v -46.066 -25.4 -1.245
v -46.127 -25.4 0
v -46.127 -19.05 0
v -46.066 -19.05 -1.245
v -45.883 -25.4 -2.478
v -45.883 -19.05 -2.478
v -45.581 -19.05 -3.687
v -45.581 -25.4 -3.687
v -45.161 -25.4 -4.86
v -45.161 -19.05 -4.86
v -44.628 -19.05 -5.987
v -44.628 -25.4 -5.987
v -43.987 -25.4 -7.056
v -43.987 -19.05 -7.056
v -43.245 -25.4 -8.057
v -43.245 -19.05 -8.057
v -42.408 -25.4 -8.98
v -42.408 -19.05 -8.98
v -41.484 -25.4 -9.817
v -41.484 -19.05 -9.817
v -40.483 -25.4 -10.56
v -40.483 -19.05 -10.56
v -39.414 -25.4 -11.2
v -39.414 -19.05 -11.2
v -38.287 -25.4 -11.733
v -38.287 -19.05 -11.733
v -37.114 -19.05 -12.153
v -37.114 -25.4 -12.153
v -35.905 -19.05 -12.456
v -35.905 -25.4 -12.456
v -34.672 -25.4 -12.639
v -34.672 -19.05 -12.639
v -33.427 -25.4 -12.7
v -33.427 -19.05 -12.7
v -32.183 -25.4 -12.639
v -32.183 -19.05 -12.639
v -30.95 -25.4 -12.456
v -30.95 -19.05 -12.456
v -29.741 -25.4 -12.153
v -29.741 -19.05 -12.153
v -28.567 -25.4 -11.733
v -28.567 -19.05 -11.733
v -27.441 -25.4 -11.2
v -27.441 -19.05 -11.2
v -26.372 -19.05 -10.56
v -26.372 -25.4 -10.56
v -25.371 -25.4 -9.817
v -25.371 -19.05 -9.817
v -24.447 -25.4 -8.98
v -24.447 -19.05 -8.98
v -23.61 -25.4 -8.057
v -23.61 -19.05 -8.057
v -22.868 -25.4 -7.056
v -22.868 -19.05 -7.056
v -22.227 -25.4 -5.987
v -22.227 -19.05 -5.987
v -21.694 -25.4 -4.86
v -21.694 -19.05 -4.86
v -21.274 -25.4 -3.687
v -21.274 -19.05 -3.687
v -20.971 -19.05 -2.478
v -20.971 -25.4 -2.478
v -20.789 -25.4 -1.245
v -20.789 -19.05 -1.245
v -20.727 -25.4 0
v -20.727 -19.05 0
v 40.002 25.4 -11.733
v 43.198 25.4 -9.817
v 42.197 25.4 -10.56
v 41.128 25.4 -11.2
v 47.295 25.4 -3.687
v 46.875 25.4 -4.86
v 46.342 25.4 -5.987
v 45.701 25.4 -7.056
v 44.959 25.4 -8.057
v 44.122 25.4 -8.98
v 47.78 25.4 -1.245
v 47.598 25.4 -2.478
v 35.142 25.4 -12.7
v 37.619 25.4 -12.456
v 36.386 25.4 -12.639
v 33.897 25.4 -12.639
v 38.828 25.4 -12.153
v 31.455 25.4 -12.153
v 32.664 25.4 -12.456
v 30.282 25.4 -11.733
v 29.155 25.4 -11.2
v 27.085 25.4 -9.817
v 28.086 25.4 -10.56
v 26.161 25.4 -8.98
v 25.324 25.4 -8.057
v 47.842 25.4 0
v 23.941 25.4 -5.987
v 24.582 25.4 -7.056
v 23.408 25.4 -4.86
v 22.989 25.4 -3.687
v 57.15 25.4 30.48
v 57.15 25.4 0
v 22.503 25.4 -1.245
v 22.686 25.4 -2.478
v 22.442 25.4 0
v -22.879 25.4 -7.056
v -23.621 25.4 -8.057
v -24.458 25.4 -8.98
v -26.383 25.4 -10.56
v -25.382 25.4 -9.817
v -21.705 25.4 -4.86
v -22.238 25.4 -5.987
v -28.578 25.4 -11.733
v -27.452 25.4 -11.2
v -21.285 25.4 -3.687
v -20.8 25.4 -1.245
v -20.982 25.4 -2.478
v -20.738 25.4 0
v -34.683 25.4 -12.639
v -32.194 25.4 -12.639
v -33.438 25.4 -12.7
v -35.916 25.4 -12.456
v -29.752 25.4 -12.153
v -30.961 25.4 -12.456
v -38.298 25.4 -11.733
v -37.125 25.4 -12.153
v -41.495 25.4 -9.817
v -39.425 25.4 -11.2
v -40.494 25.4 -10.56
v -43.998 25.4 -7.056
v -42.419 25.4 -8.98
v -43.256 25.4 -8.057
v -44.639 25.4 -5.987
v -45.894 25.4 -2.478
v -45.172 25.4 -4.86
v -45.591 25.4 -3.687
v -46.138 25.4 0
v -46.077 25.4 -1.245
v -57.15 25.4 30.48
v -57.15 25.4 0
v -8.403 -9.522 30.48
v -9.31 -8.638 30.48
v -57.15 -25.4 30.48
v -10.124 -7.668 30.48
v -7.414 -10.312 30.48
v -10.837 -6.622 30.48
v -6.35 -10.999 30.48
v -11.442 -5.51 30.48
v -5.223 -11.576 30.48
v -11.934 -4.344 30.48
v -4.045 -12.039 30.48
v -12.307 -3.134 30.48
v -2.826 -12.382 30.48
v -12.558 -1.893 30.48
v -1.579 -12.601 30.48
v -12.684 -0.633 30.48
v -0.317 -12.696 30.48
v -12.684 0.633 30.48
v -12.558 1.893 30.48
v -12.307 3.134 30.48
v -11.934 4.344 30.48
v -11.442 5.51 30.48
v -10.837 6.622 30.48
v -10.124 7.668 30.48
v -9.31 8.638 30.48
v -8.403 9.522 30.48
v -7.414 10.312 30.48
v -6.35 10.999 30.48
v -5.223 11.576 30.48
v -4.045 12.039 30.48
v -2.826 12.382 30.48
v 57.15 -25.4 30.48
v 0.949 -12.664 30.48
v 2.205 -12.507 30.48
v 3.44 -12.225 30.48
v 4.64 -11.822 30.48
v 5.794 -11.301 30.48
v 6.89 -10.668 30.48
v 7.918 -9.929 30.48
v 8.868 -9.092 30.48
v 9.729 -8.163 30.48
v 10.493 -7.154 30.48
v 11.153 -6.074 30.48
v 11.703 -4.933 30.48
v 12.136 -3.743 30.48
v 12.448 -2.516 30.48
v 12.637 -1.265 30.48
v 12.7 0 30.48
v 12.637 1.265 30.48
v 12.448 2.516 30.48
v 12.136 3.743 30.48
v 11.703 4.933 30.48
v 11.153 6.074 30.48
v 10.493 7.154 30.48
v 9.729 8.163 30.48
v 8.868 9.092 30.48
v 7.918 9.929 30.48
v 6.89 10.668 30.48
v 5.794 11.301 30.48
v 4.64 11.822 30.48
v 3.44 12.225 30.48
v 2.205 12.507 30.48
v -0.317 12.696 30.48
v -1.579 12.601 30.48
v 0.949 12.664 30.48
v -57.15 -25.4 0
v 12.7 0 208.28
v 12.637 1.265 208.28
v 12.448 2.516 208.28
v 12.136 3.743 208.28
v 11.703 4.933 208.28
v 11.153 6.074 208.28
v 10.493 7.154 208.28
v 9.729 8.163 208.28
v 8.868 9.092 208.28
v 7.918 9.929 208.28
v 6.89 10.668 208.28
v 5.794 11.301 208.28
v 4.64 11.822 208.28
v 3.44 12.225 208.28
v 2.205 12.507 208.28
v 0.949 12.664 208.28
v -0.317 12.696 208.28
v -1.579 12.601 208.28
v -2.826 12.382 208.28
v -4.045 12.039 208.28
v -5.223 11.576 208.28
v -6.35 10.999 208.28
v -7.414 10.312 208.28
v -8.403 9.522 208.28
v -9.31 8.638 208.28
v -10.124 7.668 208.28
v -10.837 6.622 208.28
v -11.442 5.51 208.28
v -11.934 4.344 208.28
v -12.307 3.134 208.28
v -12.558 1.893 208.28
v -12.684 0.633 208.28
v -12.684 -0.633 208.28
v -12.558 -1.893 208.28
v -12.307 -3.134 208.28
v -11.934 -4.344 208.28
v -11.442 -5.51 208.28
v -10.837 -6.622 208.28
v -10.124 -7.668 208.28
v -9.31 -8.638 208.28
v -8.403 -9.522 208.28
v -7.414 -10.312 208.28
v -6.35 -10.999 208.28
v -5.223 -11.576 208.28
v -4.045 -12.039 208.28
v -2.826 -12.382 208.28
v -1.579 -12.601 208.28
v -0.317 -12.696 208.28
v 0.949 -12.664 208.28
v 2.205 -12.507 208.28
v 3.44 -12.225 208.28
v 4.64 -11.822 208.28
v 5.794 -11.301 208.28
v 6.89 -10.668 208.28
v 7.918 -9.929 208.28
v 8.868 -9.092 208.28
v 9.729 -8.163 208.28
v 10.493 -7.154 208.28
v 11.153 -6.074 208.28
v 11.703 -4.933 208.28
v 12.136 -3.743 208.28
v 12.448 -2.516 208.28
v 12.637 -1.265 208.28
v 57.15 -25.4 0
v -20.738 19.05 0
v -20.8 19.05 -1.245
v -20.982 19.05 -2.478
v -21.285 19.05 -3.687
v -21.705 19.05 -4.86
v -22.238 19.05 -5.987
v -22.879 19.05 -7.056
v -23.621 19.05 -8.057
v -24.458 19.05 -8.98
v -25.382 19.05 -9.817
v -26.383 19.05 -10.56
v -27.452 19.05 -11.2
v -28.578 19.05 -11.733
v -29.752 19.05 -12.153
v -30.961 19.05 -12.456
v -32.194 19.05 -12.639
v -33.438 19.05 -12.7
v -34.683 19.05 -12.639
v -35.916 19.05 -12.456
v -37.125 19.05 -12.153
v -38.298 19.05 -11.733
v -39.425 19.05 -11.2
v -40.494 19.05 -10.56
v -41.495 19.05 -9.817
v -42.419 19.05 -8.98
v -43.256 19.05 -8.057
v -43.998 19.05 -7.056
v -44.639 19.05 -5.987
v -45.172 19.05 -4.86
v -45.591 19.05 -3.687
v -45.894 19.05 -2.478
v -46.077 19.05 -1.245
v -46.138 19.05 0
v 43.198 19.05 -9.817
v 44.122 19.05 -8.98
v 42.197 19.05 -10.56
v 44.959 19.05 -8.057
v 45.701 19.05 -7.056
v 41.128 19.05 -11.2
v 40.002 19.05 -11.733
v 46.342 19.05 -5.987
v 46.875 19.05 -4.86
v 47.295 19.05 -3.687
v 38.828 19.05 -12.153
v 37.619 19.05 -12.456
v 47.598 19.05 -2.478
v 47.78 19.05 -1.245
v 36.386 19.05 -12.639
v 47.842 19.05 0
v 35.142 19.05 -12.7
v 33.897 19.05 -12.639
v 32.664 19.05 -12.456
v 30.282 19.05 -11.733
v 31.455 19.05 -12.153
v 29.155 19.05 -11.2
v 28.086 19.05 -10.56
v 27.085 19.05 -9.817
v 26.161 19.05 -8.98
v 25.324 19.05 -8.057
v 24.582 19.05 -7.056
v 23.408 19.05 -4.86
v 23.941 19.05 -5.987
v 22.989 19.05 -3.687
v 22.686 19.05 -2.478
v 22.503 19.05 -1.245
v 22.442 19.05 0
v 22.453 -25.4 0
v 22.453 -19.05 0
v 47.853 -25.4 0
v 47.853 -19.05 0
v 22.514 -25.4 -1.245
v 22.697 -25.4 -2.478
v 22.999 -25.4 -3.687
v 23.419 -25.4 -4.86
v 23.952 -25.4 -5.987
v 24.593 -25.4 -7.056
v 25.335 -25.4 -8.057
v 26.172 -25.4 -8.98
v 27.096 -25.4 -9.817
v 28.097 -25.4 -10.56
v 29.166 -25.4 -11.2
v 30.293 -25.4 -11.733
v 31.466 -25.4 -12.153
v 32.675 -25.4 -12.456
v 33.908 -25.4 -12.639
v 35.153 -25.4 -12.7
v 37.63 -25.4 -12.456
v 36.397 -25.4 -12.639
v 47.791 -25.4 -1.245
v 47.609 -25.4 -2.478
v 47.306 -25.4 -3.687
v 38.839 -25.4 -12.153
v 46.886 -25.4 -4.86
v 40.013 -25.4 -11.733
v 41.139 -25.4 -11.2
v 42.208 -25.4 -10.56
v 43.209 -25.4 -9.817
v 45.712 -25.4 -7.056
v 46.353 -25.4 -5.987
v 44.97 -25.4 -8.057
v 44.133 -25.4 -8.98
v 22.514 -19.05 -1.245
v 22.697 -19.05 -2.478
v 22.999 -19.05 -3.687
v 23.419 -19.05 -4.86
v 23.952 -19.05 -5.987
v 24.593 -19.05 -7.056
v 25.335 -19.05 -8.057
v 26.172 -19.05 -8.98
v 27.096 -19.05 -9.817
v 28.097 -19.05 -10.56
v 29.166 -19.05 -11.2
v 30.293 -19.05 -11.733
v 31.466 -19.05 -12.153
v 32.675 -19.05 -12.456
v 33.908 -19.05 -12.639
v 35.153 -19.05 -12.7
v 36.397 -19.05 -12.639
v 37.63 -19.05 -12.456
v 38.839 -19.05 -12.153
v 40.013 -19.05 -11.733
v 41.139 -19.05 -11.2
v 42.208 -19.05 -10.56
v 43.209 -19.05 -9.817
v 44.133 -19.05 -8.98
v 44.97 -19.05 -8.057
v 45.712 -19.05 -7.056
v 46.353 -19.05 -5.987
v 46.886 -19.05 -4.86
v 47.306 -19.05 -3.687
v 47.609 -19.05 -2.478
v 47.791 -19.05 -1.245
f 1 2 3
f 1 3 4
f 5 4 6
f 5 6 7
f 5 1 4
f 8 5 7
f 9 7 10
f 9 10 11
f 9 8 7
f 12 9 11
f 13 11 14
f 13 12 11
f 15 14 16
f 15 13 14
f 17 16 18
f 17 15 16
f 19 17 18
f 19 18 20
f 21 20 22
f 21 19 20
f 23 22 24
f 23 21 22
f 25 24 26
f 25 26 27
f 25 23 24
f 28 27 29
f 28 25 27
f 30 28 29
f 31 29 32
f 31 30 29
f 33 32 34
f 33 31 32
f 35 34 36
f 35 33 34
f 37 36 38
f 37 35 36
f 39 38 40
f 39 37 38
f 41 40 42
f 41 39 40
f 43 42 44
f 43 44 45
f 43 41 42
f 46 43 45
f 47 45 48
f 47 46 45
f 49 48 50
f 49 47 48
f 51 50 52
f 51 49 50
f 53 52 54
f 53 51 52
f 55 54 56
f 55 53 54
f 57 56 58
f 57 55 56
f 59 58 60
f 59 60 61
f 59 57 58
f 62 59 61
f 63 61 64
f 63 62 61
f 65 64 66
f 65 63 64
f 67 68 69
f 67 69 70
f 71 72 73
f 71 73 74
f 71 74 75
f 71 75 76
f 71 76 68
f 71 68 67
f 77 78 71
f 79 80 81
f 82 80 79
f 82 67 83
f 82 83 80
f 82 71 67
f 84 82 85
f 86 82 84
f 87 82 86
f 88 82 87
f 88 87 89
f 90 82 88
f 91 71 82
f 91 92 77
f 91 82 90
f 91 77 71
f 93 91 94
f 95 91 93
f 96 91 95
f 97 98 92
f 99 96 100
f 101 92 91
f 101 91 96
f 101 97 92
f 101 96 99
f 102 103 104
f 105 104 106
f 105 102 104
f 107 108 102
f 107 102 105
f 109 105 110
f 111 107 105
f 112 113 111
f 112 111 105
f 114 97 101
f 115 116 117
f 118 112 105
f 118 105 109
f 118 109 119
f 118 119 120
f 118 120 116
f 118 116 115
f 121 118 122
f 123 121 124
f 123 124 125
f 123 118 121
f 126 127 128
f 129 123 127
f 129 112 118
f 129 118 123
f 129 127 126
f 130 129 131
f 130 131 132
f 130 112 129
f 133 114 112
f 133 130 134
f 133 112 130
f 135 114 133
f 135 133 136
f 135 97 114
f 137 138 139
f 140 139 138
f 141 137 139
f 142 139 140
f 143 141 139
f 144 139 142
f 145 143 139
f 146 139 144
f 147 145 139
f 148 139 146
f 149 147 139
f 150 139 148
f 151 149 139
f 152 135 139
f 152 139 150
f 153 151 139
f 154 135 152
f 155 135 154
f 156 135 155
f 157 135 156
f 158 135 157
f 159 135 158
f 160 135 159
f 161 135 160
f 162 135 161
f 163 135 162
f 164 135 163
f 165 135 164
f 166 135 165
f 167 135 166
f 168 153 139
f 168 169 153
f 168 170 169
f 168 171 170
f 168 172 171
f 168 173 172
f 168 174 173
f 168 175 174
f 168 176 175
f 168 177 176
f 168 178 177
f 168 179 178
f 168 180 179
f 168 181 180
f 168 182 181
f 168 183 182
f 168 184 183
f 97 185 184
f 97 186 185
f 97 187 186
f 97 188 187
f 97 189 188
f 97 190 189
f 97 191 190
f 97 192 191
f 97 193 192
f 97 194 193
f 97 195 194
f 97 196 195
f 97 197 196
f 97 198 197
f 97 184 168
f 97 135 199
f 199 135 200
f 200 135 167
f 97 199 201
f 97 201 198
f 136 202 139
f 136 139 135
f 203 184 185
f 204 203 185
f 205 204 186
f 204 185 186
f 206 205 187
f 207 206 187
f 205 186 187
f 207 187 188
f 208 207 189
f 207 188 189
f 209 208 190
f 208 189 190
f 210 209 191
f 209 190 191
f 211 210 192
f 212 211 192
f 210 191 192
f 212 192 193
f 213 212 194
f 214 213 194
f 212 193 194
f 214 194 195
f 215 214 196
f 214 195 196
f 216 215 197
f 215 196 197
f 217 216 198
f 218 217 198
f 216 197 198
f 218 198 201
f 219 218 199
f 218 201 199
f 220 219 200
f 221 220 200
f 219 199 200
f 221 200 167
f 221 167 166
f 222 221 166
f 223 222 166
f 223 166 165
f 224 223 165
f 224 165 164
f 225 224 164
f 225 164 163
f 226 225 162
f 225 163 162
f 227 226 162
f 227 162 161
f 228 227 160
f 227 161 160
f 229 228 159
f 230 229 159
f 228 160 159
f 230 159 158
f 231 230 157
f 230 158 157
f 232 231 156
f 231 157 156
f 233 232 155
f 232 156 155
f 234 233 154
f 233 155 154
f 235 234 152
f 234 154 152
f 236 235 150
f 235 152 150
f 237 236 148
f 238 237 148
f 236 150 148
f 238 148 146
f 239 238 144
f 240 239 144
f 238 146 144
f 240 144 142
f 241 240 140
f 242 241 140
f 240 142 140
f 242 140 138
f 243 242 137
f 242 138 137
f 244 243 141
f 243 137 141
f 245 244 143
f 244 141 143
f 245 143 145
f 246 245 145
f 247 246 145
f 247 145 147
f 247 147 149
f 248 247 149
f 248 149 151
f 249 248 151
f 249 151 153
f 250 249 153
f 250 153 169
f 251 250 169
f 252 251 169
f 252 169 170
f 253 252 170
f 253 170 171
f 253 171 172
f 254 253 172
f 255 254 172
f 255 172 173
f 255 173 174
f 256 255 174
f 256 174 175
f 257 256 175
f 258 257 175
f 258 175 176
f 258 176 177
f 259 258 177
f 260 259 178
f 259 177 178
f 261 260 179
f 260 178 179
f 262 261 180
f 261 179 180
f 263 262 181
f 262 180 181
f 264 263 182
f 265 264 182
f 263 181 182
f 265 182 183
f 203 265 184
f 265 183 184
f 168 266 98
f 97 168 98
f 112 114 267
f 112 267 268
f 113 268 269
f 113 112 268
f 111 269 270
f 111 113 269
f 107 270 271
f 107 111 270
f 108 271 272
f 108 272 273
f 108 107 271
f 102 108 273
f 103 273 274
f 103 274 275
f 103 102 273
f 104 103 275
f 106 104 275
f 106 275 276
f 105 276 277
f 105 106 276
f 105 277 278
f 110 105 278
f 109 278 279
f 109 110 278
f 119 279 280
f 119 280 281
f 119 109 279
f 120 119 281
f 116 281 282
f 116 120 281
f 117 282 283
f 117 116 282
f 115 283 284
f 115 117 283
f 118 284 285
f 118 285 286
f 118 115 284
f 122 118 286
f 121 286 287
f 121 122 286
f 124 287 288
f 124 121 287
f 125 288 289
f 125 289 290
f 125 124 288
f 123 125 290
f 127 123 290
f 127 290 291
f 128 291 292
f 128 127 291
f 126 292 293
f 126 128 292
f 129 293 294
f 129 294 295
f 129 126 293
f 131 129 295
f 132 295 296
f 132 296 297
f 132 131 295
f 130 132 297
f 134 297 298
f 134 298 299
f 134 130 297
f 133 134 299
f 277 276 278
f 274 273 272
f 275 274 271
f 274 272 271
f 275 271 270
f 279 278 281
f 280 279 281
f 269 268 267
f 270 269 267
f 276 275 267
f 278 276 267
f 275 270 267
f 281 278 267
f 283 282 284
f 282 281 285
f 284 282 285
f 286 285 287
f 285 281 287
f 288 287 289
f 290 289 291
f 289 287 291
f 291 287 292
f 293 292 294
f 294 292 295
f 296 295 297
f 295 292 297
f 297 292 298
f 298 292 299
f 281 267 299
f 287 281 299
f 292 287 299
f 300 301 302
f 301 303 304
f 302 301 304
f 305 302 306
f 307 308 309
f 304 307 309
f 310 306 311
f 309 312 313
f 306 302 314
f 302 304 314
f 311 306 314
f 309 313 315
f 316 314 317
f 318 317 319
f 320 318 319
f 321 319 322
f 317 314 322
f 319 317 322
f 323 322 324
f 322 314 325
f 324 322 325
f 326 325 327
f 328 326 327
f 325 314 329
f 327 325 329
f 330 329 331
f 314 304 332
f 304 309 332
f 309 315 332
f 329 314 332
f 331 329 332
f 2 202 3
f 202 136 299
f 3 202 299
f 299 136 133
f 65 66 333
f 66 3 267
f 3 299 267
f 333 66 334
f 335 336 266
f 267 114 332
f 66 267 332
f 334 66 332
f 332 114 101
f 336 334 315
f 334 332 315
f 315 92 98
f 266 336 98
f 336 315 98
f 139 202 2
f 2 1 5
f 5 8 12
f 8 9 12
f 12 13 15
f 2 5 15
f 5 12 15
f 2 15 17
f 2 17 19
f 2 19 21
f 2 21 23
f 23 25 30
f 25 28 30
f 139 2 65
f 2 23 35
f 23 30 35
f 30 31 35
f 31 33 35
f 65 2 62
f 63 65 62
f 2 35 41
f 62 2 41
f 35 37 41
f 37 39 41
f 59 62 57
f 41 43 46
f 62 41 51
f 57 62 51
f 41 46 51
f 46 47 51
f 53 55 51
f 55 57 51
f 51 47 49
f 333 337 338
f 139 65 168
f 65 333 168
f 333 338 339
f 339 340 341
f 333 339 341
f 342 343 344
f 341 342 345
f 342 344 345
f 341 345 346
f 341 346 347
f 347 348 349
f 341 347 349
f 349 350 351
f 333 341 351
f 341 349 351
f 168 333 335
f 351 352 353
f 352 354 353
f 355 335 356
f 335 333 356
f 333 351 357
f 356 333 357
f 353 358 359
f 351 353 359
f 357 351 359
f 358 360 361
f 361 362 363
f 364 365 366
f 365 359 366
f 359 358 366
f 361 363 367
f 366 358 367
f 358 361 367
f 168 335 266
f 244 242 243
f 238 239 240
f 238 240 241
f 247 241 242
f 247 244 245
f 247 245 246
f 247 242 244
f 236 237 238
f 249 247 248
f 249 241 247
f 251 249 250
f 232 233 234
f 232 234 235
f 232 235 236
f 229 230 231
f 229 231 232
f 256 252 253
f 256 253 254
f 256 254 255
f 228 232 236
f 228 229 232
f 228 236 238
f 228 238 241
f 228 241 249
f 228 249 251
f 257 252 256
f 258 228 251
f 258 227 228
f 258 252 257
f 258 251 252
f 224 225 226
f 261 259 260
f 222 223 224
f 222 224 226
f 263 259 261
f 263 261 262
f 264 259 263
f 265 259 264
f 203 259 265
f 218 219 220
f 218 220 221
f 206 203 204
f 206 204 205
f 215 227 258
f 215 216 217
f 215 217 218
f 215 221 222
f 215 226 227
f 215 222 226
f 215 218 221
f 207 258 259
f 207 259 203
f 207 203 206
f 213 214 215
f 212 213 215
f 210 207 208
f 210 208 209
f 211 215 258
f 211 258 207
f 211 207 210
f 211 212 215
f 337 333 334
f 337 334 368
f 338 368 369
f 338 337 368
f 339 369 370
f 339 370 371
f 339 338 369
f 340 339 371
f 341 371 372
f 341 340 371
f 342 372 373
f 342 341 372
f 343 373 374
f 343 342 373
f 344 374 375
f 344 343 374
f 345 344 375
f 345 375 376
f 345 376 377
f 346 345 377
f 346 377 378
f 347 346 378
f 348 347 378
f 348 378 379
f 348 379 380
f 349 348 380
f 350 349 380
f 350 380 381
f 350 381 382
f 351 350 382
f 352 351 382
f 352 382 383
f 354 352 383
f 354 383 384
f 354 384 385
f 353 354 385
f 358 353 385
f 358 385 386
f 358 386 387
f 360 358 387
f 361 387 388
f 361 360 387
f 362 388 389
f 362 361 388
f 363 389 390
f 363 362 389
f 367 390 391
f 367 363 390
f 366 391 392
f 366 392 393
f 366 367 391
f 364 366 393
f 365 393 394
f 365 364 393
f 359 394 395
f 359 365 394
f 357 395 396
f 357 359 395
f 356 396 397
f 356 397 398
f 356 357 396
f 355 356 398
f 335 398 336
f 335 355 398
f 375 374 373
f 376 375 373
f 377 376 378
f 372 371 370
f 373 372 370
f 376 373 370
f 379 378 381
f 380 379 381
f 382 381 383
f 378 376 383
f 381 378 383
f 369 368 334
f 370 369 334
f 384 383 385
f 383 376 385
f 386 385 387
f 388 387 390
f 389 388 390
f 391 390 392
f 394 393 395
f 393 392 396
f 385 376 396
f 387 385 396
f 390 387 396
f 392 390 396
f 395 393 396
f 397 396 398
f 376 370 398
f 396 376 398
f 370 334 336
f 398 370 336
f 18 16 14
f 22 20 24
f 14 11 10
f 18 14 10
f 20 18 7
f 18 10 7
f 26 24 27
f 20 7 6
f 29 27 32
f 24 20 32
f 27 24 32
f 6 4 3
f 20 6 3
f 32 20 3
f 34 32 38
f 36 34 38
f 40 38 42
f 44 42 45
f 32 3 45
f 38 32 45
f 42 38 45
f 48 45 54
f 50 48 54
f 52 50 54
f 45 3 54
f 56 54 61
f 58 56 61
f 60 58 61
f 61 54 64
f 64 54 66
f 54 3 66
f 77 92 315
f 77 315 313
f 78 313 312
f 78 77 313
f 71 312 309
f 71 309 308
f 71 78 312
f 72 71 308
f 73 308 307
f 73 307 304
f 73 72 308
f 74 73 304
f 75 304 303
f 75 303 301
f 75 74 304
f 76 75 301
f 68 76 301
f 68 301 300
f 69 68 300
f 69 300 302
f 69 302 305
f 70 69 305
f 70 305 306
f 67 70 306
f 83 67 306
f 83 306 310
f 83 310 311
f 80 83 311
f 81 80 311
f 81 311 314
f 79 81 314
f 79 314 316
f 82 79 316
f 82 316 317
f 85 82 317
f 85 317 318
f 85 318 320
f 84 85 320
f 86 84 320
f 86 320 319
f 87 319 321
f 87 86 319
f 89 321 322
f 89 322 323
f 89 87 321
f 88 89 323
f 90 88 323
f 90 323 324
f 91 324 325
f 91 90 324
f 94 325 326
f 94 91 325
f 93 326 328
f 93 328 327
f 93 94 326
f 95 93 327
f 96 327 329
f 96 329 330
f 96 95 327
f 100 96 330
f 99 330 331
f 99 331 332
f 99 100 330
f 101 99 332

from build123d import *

# Parameters (mm, degrees)
F0_W     = 114.3
F0_H     = 50.8
F1_DEPTH = 30.48
F2_R     = 12.7
F3_DEPTH = 177.8
F5_DEPTH = 6.35
F7_DEPTH = 6.35


with BuildPart() as f1:
    # F0 (on Top) → F1 (new body)
    with BuildSketch(Plane.XY):
        Rectangle(F0_W, F0_H)
    extrude(amount=F1_DEPTH)

    # F2 (on face) → F3 (join)
    with BuildSketch(Plane.XY.offset(30.48)):
        Circle(F2_R)
    extrude(amount=F3_DEPTH)

    # F4 (on face) → F5 (join)
    with BuildSketch(Plane(origin=(0, 25.4, 0), x_dir=(-1, 0, 0), z_dir=(0, 1, 0))):
        with BuildLine():
            Line((-47.841646862, 0), (-22.441646862, 0))
            ThreePointArc((-22.441646862, 0), (-35.141646862, 12.7), (-47.841646862, 0))
        make_face()
        with BuildLine():
            ThreePointArc((-47.841646862, 0), (-35.141646862, -12.7), (-22.441646862, 0))
            Line((-22.441646862, 0), (-47.841646862, 0))
        make_face()
        with BuildLine():
            Line((46.138353138, 0), (20.738353138, 0))
            ThreePointArc((20.738353138, 0), (33.438353138, -12.7), (46.138353138, 0))
        make_face()
    extrude(amount=-F5_DEPTH)

    # F6 (on face) → F7 (join)
    with BuildSketch(Plane.XZ.offset(25.4)):
        with BuildLine():
            ThreePointArc((-46.1274172783, 0), (-33.4274172783, -12.7), (-20.7274172783, 0))
            Line((-20.7274172783, 0), (-46.1274172783, 0))
        make_face()
        with BuildLine():
            Line((47.8525827217, 0), (22.4525827217, 0))
            ThreePointArc((22.4525827217, 0), (35.1525827217, -12.7), (47.8525827217, 0))
        make_face()
        with BuildLine():
            ThreePointArc((47.8525827217, 0), (35.1525827217, 12.7), (22.4525827217, 0))
            Line((22.4525827217, 0), (47.8525827217, 0))
        make_face()
    extrude(amount=-F7_DEPTH)


solid = f1.part
